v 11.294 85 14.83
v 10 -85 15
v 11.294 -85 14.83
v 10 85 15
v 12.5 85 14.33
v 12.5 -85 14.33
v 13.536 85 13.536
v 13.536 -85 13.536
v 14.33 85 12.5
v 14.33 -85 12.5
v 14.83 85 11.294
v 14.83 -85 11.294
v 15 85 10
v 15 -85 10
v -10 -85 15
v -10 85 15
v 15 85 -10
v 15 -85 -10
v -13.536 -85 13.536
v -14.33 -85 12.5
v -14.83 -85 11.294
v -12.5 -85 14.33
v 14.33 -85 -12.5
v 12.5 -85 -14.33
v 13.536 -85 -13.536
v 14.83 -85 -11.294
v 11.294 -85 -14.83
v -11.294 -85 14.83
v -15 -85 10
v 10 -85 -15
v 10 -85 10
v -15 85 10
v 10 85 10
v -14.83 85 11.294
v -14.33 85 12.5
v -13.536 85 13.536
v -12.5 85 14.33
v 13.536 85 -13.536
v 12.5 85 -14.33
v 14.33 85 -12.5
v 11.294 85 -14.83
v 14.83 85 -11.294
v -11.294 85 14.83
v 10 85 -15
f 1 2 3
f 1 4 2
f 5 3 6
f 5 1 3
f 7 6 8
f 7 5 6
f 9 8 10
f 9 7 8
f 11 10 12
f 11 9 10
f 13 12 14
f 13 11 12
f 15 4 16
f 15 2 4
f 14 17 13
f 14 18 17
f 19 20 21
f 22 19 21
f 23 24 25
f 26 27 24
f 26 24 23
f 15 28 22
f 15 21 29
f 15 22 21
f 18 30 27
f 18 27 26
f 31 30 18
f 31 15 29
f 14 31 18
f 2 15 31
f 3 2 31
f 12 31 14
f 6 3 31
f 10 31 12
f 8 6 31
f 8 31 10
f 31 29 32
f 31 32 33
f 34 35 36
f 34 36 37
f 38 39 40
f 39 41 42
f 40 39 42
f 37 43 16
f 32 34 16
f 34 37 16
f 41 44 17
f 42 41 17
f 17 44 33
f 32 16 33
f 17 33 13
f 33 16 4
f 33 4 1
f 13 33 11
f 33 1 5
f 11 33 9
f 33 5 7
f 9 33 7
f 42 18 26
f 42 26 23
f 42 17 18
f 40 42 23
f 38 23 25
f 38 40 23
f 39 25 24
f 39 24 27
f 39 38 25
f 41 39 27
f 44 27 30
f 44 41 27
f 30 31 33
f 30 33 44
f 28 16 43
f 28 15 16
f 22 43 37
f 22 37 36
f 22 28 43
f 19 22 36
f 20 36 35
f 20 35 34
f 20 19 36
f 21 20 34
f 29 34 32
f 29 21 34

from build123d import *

# Parameters (mm, degrees)
F1_DEPTH = 85
F2_R     = 4.99999


# Not quite as in the source:
# - a fillet or chamfer is up to 0.001 mm smaller than in the source, because OpenCascade refuses the exact size


with BuildPart() as f1:
    # F0 (on Front) → F1 (new body, symmetric)
    with BuildSketch(Plane.XZ):
        Polygon((15, 15), (-15, 15), (-15, 10), (10, 10), (10, -15), (15, -15), align=None)
    extrude(amount=F1_DEPTH, both=True)

    # F2 (radius 5 in the source; OpenCascade refuses exactly that, so slightly less here)
    f2_edges = [f1.edges().sort_by_distance(p)[0] for p in [
        (-15, 0, 15),
        (15, 0, 15),
        (15, 0, -15),
    ]]
    fillet(f2_edges, radius=F2_R)


solid = f1.part
